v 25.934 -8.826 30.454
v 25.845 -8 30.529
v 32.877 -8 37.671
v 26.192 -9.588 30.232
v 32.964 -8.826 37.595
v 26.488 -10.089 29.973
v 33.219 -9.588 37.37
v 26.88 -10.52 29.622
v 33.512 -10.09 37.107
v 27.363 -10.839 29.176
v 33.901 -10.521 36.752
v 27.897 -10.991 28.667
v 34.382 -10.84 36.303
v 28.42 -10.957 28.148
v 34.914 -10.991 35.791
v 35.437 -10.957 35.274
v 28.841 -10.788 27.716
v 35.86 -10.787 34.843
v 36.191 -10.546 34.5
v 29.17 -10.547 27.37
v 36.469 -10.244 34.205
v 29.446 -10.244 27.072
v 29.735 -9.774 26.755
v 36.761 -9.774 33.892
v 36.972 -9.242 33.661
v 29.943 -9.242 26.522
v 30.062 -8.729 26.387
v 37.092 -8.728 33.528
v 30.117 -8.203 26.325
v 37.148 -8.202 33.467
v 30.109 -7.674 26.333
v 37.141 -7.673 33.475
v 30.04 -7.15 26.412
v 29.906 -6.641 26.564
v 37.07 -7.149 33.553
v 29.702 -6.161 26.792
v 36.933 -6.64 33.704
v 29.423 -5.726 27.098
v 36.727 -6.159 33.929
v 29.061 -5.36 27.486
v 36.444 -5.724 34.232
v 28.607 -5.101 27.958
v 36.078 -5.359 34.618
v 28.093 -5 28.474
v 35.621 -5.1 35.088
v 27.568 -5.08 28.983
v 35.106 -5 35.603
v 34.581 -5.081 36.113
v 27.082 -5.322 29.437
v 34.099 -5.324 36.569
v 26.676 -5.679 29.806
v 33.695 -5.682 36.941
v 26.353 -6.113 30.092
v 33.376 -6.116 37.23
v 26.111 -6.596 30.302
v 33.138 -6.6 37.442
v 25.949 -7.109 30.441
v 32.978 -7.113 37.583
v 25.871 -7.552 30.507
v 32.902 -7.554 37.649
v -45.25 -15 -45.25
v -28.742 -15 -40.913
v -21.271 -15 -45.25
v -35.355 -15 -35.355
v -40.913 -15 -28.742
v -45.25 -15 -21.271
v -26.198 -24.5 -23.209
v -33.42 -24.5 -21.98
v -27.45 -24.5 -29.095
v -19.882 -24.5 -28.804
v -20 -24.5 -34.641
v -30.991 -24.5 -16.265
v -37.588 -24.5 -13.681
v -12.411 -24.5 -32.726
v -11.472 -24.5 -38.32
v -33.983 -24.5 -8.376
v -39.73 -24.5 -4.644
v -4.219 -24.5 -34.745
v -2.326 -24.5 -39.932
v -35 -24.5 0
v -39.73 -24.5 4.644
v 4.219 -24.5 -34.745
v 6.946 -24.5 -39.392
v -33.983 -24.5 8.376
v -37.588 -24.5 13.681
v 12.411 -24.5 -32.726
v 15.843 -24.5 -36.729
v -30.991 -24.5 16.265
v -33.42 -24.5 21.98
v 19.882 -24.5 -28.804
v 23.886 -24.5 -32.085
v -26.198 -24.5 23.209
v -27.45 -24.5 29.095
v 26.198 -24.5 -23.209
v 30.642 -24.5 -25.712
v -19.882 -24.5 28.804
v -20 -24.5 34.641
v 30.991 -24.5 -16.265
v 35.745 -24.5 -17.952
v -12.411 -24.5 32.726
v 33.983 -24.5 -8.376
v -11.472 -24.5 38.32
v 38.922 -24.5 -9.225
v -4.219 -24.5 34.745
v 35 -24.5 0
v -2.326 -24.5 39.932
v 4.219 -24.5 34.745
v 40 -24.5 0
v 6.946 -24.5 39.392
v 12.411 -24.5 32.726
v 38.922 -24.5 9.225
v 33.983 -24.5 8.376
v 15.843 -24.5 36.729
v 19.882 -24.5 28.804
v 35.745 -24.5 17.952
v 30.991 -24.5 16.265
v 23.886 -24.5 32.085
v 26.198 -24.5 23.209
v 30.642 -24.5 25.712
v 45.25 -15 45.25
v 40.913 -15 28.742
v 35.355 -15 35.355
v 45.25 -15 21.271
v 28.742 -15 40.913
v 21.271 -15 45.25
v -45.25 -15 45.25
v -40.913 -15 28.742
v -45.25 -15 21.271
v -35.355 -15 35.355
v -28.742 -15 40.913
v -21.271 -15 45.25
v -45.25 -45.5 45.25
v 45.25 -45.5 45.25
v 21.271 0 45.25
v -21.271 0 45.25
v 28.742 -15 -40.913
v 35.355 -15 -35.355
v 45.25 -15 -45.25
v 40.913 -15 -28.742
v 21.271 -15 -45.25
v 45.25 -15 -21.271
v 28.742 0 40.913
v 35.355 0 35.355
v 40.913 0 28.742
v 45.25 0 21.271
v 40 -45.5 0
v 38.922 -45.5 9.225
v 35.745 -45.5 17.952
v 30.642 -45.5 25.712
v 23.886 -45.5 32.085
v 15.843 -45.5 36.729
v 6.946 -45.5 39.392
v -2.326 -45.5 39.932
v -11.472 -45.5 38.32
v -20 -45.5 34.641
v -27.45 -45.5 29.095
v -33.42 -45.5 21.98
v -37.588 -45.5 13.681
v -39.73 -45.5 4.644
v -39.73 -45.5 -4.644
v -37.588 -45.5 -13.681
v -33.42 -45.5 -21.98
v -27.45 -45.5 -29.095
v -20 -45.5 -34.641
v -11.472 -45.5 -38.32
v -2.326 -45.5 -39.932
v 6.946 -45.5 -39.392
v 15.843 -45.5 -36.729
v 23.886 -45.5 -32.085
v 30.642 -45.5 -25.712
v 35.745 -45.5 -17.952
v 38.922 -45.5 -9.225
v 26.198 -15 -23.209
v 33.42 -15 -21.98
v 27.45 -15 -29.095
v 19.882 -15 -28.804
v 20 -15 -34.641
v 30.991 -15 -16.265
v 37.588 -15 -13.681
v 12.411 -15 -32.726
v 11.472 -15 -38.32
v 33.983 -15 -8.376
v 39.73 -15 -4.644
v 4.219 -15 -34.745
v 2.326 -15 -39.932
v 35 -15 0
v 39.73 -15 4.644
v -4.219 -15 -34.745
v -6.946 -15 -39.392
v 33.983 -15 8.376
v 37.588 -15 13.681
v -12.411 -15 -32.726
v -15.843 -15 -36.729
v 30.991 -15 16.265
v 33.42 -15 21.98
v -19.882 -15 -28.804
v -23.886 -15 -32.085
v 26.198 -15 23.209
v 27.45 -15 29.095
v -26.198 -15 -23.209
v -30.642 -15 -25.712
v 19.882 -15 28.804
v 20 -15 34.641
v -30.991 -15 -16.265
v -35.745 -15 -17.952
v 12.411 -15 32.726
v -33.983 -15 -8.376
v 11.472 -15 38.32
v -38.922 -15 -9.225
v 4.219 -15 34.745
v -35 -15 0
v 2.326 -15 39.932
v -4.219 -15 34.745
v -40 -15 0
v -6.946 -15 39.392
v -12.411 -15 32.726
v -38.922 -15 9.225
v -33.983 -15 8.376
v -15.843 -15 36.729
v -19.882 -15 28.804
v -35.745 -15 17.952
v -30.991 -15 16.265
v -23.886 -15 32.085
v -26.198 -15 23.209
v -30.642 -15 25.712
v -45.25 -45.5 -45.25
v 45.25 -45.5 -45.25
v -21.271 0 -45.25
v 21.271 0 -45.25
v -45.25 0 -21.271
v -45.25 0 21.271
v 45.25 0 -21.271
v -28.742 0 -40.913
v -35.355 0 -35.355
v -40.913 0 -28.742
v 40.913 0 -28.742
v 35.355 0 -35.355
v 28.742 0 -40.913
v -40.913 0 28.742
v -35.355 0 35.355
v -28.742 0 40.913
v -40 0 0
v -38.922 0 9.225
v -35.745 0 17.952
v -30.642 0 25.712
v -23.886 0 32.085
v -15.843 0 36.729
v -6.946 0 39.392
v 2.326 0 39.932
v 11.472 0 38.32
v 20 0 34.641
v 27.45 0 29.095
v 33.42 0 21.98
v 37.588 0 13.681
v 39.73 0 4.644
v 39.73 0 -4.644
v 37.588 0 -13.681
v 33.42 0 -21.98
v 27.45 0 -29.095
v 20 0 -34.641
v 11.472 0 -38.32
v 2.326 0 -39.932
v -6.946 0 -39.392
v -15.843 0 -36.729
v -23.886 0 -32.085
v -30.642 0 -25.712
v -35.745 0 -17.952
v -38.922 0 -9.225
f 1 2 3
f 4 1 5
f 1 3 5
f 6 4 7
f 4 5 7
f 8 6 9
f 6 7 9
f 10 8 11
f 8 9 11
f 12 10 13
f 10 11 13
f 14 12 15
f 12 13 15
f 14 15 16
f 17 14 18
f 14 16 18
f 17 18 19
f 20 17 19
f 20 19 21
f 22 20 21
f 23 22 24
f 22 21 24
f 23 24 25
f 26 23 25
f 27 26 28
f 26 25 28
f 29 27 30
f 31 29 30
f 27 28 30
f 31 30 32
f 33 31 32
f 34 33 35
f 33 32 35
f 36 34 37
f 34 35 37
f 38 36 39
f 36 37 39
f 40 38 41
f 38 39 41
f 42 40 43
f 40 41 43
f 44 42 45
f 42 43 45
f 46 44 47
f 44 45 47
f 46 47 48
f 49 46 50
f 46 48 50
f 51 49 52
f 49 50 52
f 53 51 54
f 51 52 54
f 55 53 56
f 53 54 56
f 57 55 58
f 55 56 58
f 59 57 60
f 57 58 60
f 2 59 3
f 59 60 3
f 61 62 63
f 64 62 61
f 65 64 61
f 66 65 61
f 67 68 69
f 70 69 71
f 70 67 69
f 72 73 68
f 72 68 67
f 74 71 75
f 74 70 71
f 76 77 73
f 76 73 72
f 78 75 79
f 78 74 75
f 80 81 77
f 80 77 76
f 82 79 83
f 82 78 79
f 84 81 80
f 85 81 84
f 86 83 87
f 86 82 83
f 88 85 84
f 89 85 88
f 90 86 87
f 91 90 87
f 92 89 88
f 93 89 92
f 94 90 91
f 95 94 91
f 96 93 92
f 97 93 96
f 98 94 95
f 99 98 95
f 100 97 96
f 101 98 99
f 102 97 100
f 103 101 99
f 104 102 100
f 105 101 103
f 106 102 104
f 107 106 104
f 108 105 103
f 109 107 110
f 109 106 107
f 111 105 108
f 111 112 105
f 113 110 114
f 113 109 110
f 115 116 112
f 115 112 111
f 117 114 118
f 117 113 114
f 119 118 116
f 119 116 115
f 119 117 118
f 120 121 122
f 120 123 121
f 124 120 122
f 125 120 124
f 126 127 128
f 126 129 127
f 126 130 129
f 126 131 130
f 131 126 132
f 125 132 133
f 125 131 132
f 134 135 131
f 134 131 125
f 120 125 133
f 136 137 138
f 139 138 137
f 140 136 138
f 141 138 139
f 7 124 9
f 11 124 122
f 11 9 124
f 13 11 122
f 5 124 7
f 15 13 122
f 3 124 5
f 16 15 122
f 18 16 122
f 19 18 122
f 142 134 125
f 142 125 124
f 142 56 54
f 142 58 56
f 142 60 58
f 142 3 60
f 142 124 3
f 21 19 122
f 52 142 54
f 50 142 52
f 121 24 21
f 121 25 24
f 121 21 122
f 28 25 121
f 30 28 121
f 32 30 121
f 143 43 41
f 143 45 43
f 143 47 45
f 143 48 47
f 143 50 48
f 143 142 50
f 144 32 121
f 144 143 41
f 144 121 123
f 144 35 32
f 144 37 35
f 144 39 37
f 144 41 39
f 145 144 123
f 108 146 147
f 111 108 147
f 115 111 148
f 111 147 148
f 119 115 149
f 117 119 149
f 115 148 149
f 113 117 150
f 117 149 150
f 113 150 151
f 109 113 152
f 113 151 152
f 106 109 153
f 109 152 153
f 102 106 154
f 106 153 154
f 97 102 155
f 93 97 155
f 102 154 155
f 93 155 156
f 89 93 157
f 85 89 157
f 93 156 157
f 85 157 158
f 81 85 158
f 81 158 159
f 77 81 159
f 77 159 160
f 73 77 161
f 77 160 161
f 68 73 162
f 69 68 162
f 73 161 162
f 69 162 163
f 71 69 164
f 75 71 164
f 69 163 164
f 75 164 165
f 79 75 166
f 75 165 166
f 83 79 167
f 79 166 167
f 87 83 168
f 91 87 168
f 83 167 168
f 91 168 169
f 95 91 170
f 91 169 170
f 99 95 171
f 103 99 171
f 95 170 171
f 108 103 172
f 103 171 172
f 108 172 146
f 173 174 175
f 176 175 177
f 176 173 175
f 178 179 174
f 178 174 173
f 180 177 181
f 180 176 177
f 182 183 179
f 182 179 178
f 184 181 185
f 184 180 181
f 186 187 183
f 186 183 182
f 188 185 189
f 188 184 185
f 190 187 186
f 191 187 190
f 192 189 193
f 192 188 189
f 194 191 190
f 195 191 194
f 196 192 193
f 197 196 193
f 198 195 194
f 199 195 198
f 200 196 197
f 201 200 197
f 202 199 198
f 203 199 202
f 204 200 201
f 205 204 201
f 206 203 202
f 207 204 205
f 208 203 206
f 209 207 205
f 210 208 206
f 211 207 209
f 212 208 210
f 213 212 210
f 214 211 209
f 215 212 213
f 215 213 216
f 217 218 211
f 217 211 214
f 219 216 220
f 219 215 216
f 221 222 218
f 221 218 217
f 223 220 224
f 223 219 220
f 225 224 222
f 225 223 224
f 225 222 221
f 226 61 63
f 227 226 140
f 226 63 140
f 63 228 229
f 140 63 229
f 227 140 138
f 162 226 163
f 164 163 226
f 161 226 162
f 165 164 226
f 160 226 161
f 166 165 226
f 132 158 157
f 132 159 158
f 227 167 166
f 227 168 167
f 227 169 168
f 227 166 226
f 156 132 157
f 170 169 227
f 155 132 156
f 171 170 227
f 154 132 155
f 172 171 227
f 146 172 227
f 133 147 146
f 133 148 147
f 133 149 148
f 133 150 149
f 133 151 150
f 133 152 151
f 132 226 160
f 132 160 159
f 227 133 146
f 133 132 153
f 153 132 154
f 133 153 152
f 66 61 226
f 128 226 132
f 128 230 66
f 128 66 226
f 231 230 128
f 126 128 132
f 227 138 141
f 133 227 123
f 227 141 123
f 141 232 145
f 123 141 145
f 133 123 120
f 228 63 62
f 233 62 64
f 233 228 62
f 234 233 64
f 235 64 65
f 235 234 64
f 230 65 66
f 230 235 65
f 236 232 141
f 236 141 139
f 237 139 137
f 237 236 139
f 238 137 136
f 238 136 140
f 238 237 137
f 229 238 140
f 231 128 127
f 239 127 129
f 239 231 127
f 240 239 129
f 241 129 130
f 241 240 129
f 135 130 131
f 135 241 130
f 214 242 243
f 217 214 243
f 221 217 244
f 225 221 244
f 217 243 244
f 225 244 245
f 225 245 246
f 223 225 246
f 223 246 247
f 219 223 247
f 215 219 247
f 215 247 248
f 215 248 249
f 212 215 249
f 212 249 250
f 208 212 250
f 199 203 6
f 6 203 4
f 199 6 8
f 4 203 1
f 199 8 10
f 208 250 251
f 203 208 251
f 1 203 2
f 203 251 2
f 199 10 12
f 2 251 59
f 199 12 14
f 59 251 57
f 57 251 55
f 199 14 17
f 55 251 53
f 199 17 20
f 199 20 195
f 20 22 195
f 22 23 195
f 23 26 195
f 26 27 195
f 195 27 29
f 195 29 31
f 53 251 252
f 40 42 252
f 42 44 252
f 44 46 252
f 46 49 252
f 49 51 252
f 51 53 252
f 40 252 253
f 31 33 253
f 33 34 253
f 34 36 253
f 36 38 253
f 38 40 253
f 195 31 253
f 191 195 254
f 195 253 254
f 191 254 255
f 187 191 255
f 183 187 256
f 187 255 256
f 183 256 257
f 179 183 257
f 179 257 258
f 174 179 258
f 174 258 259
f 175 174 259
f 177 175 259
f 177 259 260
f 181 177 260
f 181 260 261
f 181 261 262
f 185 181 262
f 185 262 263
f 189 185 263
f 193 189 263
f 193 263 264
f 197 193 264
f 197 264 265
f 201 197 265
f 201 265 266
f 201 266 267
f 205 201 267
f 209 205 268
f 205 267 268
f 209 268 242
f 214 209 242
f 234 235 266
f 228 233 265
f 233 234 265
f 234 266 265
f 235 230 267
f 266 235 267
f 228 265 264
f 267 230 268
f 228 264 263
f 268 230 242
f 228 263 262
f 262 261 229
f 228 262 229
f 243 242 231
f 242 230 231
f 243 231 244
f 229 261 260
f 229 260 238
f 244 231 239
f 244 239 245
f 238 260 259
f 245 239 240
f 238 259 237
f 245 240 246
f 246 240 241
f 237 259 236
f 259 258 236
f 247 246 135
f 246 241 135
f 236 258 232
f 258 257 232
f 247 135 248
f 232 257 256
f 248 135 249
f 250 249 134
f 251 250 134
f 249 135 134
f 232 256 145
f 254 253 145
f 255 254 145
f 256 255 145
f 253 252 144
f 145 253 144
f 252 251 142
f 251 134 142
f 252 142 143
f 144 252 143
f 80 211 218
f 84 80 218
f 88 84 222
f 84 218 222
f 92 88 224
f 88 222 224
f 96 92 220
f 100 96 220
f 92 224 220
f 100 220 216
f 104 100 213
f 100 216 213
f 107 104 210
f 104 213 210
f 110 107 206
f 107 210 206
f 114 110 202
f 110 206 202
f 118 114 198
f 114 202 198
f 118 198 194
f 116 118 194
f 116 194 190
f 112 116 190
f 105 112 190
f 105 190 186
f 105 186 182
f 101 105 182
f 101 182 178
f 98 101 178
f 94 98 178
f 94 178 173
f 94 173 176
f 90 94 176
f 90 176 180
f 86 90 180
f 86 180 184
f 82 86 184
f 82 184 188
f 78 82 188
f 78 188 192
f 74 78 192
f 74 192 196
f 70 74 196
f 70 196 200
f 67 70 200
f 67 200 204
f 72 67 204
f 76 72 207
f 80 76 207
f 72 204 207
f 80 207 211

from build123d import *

# Parameters (mm, degrees)
F0_W     = 90.5
F0_H     = 90.5
F1_DEPTH = 45.5
F2_R     = 40
F3_DEPTH = 15
F4_R     = 35
F5_DEPTH = 25
F6_R     = 40
F7_DEPTH = 21
F8_R     = 72.40088581
F8_R_2   = 50
F9_DEPTH = 15


with BuildPart() as f1:
    # F0 (on Front) → F1 (new body)
    with BuildSketch(Plane.XZ):
        Rectangle(F0_W, F0_H)
    extrude(amount=F1_DEPTH)

    # F2 (on face) → F3 (cut)
    with BuildSketch(Plane(origin=(0, 0, 0), x_dir=(-1, 0, 0), z_dir=(0, 1, 0))):
        Circle(F2_R)
    extrude(amount=-F3_DEPTH, mode=Mode.SUBTRACT)

    # F4 (on face) → F5 (cut)
    with BuildSketch(Plane(origin=(0, -15, 0), x_dir=(-1, 0, 0), z_dir=(0, 1, 0))):
        Circle(F4_R)
    extrude(amount=-F5_DEPTH, mode=Mode.SUBTRACT)

    # F6 (on face) → F7 (cut)
    with BuildSketch(Plane.XZ.offset(45.5)):
        Circle(F6_R)
    extrude(amount=-F7_DEPTH, mode=Mode.SUBTRACT)

    # F8 (on face) → F9 (cut)
    with BuildSketch(Plane(origin=(0, 0, 0), x_dir=(-1, 0, 0), z_dir=(0, 1, 0))):
        Circle(F8_R)
        Circle(F8_R_2, mode=Mode.SUBTRACT)
    extrude(amount=-F9_DEPTH, mode=Mode.SUBTRACT)

    # F11 (on offset) → F12 (revolve, cut)
    with BuildSketch(Plane(origin=(0, -8, 0), x_dir=(-1, 0, 0), z_dir=(0, 1, 0))):
        Polygon((-45.1513193548, 45.8626225591), (0, 0), (2.1378338561, 2.1046772683), (-43.0134854987, 47.9672998274), align=None)
    revolve(axis=Axis((22.5756596774, -8, 22.9313112795), (0.7015590894, 0, 0.7126112854)), mode=Mode.SUBTRACT)


solid = f1.part
